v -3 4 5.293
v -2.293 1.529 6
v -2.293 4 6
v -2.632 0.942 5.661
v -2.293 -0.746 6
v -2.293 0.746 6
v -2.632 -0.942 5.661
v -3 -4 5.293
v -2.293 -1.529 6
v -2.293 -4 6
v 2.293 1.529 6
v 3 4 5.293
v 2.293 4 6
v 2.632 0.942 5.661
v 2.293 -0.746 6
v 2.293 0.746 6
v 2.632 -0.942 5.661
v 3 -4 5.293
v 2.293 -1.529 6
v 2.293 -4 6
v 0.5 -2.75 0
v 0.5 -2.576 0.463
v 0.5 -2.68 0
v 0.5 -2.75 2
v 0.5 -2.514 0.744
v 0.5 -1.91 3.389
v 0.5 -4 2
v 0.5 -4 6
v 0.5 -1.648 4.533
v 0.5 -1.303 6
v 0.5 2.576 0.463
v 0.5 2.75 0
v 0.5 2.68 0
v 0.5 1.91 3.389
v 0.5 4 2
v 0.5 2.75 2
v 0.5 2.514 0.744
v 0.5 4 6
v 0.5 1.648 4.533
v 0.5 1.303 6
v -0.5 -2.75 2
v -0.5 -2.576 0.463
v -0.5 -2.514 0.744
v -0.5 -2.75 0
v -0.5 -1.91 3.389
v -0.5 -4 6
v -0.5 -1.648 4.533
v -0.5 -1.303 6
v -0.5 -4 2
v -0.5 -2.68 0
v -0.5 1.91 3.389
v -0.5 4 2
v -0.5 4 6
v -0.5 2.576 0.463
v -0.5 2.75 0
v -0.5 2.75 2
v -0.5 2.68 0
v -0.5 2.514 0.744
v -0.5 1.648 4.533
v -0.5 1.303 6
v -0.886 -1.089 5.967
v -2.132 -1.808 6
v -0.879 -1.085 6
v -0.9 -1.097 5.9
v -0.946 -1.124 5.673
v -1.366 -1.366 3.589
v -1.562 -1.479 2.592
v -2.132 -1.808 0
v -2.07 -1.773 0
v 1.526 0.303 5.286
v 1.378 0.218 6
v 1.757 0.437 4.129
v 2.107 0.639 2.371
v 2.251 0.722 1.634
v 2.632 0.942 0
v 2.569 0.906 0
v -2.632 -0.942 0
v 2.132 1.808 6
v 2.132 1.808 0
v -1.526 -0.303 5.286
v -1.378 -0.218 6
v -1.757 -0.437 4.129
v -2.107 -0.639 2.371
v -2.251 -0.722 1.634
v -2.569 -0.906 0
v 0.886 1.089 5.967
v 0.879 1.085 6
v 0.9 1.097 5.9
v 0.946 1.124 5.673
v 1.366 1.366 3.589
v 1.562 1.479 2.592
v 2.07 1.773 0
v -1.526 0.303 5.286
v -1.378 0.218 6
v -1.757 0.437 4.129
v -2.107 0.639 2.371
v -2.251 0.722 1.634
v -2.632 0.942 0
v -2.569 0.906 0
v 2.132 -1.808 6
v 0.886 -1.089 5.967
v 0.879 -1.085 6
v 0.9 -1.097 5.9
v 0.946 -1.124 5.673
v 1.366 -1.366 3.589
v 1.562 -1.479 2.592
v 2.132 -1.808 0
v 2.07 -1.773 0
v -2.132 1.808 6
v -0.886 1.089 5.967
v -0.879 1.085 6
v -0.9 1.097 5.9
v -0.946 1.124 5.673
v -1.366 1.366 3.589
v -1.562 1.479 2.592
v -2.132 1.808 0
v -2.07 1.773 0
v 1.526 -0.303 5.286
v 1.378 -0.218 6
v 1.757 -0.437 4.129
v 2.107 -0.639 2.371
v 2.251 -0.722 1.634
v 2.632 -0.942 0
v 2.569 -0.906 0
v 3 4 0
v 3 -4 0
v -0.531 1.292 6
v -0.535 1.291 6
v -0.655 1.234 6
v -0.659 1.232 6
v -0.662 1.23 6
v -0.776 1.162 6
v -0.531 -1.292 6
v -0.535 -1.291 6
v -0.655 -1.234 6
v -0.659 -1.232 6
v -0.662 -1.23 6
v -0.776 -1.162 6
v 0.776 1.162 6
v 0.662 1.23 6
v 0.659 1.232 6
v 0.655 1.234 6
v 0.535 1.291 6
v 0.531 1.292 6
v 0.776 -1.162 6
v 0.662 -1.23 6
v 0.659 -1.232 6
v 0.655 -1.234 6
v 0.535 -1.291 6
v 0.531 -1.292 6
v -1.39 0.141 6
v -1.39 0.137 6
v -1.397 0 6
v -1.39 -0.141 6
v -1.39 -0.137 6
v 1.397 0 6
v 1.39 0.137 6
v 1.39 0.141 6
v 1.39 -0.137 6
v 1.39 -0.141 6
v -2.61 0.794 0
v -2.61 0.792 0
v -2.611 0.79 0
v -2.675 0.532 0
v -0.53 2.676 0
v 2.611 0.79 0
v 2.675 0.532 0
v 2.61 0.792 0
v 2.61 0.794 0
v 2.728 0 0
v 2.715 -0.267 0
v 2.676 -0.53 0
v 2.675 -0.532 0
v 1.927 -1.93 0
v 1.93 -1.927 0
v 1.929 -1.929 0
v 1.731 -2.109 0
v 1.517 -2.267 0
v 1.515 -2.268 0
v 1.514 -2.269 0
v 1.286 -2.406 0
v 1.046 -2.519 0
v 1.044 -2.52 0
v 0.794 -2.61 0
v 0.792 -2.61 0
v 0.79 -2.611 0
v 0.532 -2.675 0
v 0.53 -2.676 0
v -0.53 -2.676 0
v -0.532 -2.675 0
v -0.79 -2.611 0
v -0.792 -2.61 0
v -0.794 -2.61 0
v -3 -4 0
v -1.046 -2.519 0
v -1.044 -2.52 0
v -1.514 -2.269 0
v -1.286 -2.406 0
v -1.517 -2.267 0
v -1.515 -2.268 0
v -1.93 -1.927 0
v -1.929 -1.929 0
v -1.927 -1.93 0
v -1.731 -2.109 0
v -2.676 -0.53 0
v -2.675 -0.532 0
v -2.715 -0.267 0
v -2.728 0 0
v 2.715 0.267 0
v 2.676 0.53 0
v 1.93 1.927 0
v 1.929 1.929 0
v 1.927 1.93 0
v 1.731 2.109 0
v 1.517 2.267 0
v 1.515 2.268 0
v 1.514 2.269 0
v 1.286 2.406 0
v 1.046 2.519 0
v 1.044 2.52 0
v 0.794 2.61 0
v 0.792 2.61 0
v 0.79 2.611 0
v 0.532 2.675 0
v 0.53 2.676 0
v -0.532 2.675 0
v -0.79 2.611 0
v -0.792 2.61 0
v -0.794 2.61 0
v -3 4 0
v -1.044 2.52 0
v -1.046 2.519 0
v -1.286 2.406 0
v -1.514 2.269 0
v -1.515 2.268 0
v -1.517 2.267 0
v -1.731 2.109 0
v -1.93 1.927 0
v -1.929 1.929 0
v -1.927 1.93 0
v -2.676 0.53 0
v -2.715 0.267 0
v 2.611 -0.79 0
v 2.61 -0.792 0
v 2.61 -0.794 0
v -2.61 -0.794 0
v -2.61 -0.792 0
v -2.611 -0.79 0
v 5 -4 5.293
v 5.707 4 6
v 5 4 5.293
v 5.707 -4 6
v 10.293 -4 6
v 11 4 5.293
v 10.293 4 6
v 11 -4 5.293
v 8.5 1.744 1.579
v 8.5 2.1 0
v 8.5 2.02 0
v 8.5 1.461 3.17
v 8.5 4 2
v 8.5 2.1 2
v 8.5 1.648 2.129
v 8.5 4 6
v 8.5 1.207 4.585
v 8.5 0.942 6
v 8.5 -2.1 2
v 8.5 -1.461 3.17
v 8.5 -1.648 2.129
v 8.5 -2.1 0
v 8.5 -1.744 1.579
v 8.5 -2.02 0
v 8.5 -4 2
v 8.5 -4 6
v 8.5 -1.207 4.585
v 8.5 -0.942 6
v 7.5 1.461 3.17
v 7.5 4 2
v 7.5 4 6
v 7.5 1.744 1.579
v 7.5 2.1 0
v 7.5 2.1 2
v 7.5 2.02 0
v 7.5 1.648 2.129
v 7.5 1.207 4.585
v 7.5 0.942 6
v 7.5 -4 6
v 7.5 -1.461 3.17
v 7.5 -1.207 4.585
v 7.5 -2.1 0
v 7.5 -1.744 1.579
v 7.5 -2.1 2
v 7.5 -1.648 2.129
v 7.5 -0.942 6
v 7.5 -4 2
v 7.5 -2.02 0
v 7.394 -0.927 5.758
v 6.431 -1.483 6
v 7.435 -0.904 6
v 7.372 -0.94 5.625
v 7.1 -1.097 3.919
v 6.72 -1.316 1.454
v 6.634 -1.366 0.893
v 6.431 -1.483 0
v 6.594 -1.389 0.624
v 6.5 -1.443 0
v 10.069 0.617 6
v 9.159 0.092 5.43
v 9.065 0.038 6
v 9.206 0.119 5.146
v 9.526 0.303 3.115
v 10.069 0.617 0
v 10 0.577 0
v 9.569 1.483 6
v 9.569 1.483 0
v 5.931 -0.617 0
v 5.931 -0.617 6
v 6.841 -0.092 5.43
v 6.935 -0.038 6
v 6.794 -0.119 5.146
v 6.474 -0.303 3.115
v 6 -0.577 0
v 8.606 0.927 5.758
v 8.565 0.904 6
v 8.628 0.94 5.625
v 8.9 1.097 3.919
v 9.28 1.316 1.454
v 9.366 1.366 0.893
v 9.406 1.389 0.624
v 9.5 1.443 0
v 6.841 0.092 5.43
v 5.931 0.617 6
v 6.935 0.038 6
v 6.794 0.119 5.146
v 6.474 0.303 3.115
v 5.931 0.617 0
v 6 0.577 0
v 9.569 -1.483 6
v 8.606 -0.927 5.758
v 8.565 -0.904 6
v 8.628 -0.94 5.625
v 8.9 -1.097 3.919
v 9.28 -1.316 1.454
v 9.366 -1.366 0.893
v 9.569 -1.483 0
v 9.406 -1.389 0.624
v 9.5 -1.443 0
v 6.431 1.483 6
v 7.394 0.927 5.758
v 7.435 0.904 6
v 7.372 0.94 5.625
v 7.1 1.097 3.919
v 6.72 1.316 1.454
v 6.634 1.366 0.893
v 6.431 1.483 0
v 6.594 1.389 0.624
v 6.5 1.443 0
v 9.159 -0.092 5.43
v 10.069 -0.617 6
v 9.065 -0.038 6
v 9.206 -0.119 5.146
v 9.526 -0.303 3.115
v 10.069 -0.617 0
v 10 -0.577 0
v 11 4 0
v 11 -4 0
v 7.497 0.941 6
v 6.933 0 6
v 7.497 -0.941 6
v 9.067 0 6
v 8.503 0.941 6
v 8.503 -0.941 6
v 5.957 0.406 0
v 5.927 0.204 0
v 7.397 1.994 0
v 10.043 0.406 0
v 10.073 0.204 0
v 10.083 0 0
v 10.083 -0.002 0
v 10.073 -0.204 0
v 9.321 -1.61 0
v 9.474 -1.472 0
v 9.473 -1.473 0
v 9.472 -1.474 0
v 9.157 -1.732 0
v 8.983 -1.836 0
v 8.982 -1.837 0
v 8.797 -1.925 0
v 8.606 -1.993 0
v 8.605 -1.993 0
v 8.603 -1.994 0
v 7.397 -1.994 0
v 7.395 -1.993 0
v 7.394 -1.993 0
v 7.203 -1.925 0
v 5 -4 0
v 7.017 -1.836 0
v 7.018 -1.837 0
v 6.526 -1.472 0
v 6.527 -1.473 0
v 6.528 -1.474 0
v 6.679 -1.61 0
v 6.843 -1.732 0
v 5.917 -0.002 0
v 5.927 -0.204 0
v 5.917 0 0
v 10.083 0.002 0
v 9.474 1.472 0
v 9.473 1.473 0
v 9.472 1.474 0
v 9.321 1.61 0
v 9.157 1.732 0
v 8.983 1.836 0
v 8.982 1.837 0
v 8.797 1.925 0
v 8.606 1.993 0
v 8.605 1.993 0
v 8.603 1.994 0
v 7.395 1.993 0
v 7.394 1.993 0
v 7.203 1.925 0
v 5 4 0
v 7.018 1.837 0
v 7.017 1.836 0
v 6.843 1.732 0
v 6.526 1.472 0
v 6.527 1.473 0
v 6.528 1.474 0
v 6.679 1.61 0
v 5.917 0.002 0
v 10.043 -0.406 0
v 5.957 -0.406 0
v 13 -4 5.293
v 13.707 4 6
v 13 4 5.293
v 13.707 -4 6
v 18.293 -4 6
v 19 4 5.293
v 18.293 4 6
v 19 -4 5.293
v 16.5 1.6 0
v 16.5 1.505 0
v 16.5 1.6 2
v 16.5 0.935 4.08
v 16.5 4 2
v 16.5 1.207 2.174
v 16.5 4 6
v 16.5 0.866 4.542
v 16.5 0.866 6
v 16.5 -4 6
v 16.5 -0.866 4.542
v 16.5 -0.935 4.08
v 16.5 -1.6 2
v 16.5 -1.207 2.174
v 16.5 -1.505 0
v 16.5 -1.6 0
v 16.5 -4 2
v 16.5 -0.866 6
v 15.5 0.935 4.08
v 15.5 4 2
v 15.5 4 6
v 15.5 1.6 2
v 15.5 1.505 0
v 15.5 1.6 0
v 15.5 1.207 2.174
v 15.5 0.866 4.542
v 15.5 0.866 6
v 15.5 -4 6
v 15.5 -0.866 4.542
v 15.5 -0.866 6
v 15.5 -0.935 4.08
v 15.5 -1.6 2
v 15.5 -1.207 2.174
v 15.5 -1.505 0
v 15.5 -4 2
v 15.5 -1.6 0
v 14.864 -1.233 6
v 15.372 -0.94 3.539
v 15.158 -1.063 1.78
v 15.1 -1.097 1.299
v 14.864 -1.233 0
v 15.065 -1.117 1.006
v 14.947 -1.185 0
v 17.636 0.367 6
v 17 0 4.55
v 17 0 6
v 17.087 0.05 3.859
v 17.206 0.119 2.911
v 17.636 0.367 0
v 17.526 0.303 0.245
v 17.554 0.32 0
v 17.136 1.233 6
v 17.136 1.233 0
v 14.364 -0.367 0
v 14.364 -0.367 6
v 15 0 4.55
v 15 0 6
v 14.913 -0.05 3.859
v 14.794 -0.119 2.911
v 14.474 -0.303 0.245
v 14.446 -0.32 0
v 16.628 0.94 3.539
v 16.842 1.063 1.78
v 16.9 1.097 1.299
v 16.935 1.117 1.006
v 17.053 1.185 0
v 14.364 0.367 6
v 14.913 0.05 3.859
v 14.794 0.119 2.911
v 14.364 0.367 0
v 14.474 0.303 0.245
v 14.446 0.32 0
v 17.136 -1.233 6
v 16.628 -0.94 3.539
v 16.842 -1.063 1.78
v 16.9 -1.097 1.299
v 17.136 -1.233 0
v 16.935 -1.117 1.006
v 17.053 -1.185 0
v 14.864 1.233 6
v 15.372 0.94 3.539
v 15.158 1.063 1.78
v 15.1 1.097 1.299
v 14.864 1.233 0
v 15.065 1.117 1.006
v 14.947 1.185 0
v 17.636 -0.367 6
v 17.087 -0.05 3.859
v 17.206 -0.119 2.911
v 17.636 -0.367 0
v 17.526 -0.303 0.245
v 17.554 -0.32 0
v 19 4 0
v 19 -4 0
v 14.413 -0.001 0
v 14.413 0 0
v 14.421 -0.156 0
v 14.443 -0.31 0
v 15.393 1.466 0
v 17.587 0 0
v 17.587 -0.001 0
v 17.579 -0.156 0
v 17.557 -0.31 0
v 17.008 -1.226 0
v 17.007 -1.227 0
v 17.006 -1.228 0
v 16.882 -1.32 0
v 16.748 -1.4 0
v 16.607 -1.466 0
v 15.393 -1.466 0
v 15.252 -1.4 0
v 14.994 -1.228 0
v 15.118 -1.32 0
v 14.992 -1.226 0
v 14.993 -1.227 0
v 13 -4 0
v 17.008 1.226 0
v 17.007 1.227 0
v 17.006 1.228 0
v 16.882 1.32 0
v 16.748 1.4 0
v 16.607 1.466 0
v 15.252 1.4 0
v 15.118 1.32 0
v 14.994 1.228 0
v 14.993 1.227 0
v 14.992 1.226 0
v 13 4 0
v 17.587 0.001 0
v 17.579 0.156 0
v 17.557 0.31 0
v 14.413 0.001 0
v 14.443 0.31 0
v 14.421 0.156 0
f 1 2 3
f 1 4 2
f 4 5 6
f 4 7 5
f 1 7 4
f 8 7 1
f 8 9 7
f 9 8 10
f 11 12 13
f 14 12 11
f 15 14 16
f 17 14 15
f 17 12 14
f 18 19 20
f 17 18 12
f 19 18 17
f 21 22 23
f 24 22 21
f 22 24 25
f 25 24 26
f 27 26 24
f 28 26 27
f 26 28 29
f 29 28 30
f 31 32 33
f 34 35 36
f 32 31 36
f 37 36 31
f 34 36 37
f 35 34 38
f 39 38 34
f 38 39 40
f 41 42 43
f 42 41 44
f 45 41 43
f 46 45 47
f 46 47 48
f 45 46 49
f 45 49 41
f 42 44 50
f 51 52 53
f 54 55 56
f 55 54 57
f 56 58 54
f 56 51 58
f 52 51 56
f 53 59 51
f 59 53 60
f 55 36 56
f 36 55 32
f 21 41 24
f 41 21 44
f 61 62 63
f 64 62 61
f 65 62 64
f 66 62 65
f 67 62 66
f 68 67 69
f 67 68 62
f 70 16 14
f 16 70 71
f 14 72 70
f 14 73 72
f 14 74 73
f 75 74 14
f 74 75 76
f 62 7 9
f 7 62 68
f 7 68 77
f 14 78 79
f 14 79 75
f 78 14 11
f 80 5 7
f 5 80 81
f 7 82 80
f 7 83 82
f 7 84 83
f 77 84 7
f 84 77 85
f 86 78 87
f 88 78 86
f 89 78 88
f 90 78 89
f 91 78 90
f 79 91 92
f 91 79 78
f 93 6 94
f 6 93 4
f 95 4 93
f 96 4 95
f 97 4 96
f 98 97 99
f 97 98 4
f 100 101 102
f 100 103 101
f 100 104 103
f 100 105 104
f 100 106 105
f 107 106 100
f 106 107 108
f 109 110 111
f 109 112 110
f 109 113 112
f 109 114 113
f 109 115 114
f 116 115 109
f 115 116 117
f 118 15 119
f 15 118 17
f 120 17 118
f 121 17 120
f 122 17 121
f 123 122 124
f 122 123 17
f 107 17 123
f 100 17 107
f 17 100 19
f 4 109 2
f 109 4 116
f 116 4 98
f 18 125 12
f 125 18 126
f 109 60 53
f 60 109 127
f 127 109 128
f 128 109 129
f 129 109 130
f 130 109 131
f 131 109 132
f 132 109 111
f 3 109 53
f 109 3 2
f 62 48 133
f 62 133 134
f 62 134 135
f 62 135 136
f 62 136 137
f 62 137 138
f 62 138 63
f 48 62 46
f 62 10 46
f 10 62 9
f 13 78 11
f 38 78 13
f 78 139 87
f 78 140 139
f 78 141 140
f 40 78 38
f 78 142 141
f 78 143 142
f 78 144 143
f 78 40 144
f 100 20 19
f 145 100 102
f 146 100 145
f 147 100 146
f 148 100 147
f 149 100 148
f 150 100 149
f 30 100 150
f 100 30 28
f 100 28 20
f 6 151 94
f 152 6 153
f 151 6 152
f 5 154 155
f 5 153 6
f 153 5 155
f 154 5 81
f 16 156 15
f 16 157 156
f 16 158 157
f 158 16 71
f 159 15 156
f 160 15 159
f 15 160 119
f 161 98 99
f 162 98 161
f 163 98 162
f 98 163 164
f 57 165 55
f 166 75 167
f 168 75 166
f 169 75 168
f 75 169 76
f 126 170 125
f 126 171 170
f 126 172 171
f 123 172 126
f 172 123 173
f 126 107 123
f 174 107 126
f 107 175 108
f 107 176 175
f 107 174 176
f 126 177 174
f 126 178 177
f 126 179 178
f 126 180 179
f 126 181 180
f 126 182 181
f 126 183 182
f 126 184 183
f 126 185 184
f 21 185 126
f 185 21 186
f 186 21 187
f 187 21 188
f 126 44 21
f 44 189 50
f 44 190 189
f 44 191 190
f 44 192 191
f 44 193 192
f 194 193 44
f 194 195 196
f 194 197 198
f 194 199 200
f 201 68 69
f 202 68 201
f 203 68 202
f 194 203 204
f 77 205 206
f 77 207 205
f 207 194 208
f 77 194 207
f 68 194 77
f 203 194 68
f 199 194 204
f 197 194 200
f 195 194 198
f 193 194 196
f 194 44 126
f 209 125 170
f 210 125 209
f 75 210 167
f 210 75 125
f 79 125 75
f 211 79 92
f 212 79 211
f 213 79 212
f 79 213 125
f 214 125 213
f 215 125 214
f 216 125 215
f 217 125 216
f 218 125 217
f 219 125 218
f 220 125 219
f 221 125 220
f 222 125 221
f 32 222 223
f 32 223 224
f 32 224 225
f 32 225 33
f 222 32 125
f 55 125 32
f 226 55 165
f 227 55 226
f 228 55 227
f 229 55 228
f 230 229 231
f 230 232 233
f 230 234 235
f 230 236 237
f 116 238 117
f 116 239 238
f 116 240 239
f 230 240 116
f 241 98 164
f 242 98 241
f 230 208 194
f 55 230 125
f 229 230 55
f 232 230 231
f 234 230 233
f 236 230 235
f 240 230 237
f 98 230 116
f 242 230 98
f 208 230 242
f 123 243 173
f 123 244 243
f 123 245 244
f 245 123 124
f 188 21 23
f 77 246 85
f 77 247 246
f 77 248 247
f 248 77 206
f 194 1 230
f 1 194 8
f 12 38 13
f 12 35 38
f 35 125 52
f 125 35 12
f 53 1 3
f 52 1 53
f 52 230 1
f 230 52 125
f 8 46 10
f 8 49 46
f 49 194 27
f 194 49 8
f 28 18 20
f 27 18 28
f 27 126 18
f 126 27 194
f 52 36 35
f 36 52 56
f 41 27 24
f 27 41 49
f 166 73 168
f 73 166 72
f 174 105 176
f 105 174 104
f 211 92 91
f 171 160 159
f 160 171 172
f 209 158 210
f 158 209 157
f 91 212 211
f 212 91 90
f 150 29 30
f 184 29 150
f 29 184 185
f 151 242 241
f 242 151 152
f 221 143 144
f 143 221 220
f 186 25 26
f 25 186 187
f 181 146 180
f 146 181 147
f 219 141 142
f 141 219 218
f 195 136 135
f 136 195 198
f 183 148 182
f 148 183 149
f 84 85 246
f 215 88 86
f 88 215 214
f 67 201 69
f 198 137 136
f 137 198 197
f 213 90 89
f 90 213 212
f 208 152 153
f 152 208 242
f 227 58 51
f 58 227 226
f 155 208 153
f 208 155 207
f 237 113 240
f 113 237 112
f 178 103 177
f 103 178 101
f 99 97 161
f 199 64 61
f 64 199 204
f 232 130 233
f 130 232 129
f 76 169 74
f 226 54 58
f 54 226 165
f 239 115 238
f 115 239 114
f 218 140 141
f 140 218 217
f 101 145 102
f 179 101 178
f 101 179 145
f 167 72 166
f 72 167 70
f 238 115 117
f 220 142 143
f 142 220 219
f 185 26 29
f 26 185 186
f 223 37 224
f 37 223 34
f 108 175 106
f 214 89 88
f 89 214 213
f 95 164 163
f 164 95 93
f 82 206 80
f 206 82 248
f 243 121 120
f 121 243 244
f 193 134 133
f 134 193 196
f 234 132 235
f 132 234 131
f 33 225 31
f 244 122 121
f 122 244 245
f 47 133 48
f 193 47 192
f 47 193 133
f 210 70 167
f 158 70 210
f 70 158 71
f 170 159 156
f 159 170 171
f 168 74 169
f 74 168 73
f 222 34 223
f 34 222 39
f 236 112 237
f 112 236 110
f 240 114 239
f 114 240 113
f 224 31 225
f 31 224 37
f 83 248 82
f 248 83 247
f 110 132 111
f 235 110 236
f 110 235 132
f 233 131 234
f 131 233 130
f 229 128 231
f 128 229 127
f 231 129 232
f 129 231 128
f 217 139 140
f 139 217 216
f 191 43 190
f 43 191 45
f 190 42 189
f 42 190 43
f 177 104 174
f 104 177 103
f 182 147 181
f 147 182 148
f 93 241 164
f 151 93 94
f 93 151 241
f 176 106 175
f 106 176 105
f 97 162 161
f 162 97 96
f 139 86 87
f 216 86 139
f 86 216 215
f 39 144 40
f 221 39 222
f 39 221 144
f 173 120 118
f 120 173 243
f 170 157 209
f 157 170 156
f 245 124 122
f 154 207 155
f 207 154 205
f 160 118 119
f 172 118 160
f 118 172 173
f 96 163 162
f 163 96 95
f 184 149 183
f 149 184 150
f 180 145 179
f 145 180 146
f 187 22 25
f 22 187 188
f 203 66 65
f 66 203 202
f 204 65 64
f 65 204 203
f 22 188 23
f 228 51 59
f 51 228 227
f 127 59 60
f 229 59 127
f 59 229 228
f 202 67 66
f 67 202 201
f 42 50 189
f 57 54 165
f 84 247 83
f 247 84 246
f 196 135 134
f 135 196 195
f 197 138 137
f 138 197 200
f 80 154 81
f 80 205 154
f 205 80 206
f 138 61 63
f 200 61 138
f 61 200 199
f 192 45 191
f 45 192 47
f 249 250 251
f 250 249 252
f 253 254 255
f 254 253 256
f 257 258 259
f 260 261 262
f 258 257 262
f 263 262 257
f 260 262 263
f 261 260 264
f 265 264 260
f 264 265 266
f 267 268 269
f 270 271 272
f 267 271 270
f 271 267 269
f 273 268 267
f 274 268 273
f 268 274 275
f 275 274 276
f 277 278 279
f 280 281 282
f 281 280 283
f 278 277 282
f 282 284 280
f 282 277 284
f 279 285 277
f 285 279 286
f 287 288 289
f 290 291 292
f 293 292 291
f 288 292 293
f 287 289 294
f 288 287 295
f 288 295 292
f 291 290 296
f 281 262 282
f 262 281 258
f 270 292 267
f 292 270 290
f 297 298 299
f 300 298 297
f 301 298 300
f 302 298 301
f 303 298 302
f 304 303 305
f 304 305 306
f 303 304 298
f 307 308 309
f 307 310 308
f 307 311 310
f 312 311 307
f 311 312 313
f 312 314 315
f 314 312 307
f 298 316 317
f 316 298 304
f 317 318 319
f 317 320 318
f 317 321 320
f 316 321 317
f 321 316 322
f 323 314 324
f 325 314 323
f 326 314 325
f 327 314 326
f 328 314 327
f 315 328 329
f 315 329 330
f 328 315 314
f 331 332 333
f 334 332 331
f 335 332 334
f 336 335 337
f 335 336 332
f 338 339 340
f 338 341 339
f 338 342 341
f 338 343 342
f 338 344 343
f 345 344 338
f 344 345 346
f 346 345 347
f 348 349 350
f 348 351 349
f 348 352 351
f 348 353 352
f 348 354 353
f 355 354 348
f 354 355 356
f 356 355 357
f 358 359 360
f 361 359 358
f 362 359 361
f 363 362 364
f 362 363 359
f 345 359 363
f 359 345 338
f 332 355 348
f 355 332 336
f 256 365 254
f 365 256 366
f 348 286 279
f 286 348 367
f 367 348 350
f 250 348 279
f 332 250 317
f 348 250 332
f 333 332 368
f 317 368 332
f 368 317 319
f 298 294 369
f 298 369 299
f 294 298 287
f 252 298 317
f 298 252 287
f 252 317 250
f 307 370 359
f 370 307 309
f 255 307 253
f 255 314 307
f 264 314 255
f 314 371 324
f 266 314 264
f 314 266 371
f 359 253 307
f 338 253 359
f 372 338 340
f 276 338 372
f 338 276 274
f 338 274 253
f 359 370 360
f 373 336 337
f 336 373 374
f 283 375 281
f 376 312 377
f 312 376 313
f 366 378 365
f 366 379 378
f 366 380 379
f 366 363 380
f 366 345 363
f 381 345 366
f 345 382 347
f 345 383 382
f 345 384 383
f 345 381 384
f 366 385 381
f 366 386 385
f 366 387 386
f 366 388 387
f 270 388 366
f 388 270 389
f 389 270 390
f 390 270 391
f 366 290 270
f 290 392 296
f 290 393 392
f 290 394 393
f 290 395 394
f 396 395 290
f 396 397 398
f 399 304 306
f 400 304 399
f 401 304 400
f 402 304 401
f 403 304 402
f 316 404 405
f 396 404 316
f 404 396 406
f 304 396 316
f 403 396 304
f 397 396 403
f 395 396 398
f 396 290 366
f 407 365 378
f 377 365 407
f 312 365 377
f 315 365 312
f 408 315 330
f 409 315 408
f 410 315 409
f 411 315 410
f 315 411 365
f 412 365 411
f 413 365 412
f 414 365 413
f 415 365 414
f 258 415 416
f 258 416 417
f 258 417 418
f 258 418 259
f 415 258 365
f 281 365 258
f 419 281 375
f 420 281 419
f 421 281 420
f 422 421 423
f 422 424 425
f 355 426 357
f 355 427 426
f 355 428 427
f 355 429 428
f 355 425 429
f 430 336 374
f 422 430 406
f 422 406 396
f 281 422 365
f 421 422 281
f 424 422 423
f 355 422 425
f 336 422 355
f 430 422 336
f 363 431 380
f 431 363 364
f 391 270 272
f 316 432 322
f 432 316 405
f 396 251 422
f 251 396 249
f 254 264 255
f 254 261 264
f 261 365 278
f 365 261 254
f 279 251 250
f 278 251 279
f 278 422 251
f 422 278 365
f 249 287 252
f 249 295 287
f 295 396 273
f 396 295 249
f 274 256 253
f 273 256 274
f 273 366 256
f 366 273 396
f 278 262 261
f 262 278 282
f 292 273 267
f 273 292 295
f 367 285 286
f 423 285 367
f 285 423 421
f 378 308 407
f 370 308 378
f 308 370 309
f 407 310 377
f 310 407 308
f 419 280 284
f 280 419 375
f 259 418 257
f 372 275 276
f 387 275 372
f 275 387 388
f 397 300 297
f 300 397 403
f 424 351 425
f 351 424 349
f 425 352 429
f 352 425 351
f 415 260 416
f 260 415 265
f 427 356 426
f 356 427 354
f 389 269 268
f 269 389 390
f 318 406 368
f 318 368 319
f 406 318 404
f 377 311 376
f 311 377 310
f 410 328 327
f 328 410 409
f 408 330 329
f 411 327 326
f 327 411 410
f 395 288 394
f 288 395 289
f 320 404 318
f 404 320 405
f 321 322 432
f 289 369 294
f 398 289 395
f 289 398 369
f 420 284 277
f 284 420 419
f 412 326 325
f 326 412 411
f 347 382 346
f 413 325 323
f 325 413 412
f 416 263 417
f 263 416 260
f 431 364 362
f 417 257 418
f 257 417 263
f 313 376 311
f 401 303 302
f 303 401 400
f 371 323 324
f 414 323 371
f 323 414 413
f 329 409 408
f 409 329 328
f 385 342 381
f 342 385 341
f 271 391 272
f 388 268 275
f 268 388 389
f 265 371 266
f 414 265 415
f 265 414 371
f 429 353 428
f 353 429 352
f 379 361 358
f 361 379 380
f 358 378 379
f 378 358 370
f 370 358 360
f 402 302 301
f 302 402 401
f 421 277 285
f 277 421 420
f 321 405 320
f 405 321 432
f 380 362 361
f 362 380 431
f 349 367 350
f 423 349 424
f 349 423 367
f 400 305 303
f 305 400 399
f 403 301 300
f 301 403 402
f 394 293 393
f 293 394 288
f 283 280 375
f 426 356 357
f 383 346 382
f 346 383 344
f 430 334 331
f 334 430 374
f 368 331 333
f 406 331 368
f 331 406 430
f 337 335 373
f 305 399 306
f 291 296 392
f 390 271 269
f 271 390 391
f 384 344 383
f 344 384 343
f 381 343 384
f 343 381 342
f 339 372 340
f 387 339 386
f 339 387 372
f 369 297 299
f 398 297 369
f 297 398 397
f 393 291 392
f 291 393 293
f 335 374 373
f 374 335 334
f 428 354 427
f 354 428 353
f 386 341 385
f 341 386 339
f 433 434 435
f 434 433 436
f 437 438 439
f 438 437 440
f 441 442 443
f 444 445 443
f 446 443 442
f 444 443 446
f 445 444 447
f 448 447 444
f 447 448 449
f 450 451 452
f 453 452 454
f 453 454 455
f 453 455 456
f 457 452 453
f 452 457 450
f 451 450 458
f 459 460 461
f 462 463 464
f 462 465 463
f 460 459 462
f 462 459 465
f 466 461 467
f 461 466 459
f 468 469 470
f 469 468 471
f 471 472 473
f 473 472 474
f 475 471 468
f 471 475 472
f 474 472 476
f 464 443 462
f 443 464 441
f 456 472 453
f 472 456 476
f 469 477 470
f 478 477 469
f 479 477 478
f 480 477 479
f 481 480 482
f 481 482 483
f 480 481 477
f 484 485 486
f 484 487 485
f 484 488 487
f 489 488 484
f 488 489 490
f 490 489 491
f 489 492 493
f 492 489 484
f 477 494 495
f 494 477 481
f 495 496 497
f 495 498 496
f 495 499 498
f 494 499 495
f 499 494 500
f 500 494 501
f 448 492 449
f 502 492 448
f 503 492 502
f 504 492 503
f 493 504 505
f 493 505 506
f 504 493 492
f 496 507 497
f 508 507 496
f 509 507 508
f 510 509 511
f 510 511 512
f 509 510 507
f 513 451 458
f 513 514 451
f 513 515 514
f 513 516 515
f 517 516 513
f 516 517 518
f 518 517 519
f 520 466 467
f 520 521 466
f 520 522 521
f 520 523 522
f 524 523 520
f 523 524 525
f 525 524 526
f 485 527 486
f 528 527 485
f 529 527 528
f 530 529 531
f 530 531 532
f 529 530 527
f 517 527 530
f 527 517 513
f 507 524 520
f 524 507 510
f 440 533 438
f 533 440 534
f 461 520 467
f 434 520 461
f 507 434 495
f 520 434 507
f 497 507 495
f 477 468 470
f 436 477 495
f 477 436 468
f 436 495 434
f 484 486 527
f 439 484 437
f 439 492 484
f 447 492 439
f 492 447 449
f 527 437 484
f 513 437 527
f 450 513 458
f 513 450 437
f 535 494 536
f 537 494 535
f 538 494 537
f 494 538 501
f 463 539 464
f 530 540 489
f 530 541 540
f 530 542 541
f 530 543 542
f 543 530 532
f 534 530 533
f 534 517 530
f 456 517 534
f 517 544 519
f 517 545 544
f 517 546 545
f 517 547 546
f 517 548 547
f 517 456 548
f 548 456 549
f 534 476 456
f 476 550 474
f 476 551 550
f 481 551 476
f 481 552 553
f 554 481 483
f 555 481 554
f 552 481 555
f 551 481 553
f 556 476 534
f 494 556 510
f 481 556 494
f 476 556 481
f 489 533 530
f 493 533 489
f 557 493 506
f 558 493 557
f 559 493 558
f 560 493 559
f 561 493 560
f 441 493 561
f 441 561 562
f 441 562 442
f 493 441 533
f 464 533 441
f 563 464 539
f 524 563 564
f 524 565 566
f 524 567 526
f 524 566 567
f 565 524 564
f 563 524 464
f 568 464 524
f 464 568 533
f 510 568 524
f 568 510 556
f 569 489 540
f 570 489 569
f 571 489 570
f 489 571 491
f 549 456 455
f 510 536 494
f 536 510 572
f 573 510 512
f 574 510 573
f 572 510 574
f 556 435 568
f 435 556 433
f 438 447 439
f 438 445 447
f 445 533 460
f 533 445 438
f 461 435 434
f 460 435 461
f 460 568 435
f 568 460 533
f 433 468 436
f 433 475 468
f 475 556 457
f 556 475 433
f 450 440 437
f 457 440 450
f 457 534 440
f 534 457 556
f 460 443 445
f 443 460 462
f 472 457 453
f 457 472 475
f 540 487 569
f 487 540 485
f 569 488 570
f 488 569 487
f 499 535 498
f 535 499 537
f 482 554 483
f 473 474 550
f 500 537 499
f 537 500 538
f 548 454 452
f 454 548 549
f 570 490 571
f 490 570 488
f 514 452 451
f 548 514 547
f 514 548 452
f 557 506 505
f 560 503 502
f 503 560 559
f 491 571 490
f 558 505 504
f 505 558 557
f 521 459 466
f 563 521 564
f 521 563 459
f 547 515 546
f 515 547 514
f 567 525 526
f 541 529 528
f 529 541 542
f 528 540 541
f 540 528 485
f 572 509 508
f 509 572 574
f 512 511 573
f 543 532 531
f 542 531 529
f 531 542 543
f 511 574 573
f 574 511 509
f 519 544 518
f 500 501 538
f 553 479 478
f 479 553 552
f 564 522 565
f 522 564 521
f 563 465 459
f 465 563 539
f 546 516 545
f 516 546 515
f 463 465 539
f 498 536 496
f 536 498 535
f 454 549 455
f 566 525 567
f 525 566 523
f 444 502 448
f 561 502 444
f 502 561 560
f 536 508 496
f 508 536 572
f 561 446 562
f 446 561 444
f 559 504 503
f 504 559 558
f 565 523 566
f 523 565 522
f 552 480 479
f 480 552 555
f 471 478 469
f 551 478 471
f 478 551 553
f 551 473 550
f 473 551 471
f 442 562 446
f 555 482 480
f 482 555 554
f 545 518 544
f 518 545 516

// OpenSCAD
// file: configuration.scad
$fn = 18;

slop = .2;

wall = 5;

bolt_slop = .5;
nut_slop = .85;
bolt_dia = 5+bolt_slop;
bolt_rad = bolt_dia/2;
bolt_cap_dia = 10+bolt_slop;
bolt_cap_rad = bolt_cap_dia/2;
nut_dia = 9+nut_slop;
nut_rad = nut_dia/2;
nut_height = 3.25;
lock_nut_height = 5.25;

m3bolt_dia = 3+bolt_slop;
m3bolt_rad = m3bolt_dia/2;
m3nut_dia = 6.1+nut_slop;
m3nut_rad = m3nut_dia/2;
m3nut_height = 3;

ext_x = 20+slop;
ext_y = 60+slop;
// main file
include <configuration.scad>;

slot_w = 6;
slot_h = 6;
rivet_w = slot_w+2;

tslot_rivet(bolt_dia);
translate([rivet_w, 0,0]) tslot_rivet(4.2);
translate([rivet_w*2, 0,0]) tslot_rivet(3.2);
facets = 3;

$fn=64;

module tslot_rivet(b = bolt_dia){
	dia = b;
	rad = dia/2;

	difference(){
		translate([0,0,slot_h/2]) cube([slot_w, rivet_w, slot_h], center=true);

		//cut the corners
		for(i=[0:1]) mirror([i,0,0]) translate([-slot_w/2,0,slot_h]) rotate([0,45,0]) cube([1,rivet_w+1, slot_h], center=true);
	
		//pivot slot
		translate([0,0,slot_h/2+2]) cube([1,rivet_w+1, slot_h], center=true);
		//bolt hole
		translate([0,0,-.1]) cylinder(r1=rad, r2=rad/2, h=slot_h+.2);

		//grip slots
		for(i=[0:facets]){
			rotate([0,0,i*360/facets]) translate([0,0,slot_h/2]) cube([1, dia, slot_h+1], center=true);
		}
	}	
}
